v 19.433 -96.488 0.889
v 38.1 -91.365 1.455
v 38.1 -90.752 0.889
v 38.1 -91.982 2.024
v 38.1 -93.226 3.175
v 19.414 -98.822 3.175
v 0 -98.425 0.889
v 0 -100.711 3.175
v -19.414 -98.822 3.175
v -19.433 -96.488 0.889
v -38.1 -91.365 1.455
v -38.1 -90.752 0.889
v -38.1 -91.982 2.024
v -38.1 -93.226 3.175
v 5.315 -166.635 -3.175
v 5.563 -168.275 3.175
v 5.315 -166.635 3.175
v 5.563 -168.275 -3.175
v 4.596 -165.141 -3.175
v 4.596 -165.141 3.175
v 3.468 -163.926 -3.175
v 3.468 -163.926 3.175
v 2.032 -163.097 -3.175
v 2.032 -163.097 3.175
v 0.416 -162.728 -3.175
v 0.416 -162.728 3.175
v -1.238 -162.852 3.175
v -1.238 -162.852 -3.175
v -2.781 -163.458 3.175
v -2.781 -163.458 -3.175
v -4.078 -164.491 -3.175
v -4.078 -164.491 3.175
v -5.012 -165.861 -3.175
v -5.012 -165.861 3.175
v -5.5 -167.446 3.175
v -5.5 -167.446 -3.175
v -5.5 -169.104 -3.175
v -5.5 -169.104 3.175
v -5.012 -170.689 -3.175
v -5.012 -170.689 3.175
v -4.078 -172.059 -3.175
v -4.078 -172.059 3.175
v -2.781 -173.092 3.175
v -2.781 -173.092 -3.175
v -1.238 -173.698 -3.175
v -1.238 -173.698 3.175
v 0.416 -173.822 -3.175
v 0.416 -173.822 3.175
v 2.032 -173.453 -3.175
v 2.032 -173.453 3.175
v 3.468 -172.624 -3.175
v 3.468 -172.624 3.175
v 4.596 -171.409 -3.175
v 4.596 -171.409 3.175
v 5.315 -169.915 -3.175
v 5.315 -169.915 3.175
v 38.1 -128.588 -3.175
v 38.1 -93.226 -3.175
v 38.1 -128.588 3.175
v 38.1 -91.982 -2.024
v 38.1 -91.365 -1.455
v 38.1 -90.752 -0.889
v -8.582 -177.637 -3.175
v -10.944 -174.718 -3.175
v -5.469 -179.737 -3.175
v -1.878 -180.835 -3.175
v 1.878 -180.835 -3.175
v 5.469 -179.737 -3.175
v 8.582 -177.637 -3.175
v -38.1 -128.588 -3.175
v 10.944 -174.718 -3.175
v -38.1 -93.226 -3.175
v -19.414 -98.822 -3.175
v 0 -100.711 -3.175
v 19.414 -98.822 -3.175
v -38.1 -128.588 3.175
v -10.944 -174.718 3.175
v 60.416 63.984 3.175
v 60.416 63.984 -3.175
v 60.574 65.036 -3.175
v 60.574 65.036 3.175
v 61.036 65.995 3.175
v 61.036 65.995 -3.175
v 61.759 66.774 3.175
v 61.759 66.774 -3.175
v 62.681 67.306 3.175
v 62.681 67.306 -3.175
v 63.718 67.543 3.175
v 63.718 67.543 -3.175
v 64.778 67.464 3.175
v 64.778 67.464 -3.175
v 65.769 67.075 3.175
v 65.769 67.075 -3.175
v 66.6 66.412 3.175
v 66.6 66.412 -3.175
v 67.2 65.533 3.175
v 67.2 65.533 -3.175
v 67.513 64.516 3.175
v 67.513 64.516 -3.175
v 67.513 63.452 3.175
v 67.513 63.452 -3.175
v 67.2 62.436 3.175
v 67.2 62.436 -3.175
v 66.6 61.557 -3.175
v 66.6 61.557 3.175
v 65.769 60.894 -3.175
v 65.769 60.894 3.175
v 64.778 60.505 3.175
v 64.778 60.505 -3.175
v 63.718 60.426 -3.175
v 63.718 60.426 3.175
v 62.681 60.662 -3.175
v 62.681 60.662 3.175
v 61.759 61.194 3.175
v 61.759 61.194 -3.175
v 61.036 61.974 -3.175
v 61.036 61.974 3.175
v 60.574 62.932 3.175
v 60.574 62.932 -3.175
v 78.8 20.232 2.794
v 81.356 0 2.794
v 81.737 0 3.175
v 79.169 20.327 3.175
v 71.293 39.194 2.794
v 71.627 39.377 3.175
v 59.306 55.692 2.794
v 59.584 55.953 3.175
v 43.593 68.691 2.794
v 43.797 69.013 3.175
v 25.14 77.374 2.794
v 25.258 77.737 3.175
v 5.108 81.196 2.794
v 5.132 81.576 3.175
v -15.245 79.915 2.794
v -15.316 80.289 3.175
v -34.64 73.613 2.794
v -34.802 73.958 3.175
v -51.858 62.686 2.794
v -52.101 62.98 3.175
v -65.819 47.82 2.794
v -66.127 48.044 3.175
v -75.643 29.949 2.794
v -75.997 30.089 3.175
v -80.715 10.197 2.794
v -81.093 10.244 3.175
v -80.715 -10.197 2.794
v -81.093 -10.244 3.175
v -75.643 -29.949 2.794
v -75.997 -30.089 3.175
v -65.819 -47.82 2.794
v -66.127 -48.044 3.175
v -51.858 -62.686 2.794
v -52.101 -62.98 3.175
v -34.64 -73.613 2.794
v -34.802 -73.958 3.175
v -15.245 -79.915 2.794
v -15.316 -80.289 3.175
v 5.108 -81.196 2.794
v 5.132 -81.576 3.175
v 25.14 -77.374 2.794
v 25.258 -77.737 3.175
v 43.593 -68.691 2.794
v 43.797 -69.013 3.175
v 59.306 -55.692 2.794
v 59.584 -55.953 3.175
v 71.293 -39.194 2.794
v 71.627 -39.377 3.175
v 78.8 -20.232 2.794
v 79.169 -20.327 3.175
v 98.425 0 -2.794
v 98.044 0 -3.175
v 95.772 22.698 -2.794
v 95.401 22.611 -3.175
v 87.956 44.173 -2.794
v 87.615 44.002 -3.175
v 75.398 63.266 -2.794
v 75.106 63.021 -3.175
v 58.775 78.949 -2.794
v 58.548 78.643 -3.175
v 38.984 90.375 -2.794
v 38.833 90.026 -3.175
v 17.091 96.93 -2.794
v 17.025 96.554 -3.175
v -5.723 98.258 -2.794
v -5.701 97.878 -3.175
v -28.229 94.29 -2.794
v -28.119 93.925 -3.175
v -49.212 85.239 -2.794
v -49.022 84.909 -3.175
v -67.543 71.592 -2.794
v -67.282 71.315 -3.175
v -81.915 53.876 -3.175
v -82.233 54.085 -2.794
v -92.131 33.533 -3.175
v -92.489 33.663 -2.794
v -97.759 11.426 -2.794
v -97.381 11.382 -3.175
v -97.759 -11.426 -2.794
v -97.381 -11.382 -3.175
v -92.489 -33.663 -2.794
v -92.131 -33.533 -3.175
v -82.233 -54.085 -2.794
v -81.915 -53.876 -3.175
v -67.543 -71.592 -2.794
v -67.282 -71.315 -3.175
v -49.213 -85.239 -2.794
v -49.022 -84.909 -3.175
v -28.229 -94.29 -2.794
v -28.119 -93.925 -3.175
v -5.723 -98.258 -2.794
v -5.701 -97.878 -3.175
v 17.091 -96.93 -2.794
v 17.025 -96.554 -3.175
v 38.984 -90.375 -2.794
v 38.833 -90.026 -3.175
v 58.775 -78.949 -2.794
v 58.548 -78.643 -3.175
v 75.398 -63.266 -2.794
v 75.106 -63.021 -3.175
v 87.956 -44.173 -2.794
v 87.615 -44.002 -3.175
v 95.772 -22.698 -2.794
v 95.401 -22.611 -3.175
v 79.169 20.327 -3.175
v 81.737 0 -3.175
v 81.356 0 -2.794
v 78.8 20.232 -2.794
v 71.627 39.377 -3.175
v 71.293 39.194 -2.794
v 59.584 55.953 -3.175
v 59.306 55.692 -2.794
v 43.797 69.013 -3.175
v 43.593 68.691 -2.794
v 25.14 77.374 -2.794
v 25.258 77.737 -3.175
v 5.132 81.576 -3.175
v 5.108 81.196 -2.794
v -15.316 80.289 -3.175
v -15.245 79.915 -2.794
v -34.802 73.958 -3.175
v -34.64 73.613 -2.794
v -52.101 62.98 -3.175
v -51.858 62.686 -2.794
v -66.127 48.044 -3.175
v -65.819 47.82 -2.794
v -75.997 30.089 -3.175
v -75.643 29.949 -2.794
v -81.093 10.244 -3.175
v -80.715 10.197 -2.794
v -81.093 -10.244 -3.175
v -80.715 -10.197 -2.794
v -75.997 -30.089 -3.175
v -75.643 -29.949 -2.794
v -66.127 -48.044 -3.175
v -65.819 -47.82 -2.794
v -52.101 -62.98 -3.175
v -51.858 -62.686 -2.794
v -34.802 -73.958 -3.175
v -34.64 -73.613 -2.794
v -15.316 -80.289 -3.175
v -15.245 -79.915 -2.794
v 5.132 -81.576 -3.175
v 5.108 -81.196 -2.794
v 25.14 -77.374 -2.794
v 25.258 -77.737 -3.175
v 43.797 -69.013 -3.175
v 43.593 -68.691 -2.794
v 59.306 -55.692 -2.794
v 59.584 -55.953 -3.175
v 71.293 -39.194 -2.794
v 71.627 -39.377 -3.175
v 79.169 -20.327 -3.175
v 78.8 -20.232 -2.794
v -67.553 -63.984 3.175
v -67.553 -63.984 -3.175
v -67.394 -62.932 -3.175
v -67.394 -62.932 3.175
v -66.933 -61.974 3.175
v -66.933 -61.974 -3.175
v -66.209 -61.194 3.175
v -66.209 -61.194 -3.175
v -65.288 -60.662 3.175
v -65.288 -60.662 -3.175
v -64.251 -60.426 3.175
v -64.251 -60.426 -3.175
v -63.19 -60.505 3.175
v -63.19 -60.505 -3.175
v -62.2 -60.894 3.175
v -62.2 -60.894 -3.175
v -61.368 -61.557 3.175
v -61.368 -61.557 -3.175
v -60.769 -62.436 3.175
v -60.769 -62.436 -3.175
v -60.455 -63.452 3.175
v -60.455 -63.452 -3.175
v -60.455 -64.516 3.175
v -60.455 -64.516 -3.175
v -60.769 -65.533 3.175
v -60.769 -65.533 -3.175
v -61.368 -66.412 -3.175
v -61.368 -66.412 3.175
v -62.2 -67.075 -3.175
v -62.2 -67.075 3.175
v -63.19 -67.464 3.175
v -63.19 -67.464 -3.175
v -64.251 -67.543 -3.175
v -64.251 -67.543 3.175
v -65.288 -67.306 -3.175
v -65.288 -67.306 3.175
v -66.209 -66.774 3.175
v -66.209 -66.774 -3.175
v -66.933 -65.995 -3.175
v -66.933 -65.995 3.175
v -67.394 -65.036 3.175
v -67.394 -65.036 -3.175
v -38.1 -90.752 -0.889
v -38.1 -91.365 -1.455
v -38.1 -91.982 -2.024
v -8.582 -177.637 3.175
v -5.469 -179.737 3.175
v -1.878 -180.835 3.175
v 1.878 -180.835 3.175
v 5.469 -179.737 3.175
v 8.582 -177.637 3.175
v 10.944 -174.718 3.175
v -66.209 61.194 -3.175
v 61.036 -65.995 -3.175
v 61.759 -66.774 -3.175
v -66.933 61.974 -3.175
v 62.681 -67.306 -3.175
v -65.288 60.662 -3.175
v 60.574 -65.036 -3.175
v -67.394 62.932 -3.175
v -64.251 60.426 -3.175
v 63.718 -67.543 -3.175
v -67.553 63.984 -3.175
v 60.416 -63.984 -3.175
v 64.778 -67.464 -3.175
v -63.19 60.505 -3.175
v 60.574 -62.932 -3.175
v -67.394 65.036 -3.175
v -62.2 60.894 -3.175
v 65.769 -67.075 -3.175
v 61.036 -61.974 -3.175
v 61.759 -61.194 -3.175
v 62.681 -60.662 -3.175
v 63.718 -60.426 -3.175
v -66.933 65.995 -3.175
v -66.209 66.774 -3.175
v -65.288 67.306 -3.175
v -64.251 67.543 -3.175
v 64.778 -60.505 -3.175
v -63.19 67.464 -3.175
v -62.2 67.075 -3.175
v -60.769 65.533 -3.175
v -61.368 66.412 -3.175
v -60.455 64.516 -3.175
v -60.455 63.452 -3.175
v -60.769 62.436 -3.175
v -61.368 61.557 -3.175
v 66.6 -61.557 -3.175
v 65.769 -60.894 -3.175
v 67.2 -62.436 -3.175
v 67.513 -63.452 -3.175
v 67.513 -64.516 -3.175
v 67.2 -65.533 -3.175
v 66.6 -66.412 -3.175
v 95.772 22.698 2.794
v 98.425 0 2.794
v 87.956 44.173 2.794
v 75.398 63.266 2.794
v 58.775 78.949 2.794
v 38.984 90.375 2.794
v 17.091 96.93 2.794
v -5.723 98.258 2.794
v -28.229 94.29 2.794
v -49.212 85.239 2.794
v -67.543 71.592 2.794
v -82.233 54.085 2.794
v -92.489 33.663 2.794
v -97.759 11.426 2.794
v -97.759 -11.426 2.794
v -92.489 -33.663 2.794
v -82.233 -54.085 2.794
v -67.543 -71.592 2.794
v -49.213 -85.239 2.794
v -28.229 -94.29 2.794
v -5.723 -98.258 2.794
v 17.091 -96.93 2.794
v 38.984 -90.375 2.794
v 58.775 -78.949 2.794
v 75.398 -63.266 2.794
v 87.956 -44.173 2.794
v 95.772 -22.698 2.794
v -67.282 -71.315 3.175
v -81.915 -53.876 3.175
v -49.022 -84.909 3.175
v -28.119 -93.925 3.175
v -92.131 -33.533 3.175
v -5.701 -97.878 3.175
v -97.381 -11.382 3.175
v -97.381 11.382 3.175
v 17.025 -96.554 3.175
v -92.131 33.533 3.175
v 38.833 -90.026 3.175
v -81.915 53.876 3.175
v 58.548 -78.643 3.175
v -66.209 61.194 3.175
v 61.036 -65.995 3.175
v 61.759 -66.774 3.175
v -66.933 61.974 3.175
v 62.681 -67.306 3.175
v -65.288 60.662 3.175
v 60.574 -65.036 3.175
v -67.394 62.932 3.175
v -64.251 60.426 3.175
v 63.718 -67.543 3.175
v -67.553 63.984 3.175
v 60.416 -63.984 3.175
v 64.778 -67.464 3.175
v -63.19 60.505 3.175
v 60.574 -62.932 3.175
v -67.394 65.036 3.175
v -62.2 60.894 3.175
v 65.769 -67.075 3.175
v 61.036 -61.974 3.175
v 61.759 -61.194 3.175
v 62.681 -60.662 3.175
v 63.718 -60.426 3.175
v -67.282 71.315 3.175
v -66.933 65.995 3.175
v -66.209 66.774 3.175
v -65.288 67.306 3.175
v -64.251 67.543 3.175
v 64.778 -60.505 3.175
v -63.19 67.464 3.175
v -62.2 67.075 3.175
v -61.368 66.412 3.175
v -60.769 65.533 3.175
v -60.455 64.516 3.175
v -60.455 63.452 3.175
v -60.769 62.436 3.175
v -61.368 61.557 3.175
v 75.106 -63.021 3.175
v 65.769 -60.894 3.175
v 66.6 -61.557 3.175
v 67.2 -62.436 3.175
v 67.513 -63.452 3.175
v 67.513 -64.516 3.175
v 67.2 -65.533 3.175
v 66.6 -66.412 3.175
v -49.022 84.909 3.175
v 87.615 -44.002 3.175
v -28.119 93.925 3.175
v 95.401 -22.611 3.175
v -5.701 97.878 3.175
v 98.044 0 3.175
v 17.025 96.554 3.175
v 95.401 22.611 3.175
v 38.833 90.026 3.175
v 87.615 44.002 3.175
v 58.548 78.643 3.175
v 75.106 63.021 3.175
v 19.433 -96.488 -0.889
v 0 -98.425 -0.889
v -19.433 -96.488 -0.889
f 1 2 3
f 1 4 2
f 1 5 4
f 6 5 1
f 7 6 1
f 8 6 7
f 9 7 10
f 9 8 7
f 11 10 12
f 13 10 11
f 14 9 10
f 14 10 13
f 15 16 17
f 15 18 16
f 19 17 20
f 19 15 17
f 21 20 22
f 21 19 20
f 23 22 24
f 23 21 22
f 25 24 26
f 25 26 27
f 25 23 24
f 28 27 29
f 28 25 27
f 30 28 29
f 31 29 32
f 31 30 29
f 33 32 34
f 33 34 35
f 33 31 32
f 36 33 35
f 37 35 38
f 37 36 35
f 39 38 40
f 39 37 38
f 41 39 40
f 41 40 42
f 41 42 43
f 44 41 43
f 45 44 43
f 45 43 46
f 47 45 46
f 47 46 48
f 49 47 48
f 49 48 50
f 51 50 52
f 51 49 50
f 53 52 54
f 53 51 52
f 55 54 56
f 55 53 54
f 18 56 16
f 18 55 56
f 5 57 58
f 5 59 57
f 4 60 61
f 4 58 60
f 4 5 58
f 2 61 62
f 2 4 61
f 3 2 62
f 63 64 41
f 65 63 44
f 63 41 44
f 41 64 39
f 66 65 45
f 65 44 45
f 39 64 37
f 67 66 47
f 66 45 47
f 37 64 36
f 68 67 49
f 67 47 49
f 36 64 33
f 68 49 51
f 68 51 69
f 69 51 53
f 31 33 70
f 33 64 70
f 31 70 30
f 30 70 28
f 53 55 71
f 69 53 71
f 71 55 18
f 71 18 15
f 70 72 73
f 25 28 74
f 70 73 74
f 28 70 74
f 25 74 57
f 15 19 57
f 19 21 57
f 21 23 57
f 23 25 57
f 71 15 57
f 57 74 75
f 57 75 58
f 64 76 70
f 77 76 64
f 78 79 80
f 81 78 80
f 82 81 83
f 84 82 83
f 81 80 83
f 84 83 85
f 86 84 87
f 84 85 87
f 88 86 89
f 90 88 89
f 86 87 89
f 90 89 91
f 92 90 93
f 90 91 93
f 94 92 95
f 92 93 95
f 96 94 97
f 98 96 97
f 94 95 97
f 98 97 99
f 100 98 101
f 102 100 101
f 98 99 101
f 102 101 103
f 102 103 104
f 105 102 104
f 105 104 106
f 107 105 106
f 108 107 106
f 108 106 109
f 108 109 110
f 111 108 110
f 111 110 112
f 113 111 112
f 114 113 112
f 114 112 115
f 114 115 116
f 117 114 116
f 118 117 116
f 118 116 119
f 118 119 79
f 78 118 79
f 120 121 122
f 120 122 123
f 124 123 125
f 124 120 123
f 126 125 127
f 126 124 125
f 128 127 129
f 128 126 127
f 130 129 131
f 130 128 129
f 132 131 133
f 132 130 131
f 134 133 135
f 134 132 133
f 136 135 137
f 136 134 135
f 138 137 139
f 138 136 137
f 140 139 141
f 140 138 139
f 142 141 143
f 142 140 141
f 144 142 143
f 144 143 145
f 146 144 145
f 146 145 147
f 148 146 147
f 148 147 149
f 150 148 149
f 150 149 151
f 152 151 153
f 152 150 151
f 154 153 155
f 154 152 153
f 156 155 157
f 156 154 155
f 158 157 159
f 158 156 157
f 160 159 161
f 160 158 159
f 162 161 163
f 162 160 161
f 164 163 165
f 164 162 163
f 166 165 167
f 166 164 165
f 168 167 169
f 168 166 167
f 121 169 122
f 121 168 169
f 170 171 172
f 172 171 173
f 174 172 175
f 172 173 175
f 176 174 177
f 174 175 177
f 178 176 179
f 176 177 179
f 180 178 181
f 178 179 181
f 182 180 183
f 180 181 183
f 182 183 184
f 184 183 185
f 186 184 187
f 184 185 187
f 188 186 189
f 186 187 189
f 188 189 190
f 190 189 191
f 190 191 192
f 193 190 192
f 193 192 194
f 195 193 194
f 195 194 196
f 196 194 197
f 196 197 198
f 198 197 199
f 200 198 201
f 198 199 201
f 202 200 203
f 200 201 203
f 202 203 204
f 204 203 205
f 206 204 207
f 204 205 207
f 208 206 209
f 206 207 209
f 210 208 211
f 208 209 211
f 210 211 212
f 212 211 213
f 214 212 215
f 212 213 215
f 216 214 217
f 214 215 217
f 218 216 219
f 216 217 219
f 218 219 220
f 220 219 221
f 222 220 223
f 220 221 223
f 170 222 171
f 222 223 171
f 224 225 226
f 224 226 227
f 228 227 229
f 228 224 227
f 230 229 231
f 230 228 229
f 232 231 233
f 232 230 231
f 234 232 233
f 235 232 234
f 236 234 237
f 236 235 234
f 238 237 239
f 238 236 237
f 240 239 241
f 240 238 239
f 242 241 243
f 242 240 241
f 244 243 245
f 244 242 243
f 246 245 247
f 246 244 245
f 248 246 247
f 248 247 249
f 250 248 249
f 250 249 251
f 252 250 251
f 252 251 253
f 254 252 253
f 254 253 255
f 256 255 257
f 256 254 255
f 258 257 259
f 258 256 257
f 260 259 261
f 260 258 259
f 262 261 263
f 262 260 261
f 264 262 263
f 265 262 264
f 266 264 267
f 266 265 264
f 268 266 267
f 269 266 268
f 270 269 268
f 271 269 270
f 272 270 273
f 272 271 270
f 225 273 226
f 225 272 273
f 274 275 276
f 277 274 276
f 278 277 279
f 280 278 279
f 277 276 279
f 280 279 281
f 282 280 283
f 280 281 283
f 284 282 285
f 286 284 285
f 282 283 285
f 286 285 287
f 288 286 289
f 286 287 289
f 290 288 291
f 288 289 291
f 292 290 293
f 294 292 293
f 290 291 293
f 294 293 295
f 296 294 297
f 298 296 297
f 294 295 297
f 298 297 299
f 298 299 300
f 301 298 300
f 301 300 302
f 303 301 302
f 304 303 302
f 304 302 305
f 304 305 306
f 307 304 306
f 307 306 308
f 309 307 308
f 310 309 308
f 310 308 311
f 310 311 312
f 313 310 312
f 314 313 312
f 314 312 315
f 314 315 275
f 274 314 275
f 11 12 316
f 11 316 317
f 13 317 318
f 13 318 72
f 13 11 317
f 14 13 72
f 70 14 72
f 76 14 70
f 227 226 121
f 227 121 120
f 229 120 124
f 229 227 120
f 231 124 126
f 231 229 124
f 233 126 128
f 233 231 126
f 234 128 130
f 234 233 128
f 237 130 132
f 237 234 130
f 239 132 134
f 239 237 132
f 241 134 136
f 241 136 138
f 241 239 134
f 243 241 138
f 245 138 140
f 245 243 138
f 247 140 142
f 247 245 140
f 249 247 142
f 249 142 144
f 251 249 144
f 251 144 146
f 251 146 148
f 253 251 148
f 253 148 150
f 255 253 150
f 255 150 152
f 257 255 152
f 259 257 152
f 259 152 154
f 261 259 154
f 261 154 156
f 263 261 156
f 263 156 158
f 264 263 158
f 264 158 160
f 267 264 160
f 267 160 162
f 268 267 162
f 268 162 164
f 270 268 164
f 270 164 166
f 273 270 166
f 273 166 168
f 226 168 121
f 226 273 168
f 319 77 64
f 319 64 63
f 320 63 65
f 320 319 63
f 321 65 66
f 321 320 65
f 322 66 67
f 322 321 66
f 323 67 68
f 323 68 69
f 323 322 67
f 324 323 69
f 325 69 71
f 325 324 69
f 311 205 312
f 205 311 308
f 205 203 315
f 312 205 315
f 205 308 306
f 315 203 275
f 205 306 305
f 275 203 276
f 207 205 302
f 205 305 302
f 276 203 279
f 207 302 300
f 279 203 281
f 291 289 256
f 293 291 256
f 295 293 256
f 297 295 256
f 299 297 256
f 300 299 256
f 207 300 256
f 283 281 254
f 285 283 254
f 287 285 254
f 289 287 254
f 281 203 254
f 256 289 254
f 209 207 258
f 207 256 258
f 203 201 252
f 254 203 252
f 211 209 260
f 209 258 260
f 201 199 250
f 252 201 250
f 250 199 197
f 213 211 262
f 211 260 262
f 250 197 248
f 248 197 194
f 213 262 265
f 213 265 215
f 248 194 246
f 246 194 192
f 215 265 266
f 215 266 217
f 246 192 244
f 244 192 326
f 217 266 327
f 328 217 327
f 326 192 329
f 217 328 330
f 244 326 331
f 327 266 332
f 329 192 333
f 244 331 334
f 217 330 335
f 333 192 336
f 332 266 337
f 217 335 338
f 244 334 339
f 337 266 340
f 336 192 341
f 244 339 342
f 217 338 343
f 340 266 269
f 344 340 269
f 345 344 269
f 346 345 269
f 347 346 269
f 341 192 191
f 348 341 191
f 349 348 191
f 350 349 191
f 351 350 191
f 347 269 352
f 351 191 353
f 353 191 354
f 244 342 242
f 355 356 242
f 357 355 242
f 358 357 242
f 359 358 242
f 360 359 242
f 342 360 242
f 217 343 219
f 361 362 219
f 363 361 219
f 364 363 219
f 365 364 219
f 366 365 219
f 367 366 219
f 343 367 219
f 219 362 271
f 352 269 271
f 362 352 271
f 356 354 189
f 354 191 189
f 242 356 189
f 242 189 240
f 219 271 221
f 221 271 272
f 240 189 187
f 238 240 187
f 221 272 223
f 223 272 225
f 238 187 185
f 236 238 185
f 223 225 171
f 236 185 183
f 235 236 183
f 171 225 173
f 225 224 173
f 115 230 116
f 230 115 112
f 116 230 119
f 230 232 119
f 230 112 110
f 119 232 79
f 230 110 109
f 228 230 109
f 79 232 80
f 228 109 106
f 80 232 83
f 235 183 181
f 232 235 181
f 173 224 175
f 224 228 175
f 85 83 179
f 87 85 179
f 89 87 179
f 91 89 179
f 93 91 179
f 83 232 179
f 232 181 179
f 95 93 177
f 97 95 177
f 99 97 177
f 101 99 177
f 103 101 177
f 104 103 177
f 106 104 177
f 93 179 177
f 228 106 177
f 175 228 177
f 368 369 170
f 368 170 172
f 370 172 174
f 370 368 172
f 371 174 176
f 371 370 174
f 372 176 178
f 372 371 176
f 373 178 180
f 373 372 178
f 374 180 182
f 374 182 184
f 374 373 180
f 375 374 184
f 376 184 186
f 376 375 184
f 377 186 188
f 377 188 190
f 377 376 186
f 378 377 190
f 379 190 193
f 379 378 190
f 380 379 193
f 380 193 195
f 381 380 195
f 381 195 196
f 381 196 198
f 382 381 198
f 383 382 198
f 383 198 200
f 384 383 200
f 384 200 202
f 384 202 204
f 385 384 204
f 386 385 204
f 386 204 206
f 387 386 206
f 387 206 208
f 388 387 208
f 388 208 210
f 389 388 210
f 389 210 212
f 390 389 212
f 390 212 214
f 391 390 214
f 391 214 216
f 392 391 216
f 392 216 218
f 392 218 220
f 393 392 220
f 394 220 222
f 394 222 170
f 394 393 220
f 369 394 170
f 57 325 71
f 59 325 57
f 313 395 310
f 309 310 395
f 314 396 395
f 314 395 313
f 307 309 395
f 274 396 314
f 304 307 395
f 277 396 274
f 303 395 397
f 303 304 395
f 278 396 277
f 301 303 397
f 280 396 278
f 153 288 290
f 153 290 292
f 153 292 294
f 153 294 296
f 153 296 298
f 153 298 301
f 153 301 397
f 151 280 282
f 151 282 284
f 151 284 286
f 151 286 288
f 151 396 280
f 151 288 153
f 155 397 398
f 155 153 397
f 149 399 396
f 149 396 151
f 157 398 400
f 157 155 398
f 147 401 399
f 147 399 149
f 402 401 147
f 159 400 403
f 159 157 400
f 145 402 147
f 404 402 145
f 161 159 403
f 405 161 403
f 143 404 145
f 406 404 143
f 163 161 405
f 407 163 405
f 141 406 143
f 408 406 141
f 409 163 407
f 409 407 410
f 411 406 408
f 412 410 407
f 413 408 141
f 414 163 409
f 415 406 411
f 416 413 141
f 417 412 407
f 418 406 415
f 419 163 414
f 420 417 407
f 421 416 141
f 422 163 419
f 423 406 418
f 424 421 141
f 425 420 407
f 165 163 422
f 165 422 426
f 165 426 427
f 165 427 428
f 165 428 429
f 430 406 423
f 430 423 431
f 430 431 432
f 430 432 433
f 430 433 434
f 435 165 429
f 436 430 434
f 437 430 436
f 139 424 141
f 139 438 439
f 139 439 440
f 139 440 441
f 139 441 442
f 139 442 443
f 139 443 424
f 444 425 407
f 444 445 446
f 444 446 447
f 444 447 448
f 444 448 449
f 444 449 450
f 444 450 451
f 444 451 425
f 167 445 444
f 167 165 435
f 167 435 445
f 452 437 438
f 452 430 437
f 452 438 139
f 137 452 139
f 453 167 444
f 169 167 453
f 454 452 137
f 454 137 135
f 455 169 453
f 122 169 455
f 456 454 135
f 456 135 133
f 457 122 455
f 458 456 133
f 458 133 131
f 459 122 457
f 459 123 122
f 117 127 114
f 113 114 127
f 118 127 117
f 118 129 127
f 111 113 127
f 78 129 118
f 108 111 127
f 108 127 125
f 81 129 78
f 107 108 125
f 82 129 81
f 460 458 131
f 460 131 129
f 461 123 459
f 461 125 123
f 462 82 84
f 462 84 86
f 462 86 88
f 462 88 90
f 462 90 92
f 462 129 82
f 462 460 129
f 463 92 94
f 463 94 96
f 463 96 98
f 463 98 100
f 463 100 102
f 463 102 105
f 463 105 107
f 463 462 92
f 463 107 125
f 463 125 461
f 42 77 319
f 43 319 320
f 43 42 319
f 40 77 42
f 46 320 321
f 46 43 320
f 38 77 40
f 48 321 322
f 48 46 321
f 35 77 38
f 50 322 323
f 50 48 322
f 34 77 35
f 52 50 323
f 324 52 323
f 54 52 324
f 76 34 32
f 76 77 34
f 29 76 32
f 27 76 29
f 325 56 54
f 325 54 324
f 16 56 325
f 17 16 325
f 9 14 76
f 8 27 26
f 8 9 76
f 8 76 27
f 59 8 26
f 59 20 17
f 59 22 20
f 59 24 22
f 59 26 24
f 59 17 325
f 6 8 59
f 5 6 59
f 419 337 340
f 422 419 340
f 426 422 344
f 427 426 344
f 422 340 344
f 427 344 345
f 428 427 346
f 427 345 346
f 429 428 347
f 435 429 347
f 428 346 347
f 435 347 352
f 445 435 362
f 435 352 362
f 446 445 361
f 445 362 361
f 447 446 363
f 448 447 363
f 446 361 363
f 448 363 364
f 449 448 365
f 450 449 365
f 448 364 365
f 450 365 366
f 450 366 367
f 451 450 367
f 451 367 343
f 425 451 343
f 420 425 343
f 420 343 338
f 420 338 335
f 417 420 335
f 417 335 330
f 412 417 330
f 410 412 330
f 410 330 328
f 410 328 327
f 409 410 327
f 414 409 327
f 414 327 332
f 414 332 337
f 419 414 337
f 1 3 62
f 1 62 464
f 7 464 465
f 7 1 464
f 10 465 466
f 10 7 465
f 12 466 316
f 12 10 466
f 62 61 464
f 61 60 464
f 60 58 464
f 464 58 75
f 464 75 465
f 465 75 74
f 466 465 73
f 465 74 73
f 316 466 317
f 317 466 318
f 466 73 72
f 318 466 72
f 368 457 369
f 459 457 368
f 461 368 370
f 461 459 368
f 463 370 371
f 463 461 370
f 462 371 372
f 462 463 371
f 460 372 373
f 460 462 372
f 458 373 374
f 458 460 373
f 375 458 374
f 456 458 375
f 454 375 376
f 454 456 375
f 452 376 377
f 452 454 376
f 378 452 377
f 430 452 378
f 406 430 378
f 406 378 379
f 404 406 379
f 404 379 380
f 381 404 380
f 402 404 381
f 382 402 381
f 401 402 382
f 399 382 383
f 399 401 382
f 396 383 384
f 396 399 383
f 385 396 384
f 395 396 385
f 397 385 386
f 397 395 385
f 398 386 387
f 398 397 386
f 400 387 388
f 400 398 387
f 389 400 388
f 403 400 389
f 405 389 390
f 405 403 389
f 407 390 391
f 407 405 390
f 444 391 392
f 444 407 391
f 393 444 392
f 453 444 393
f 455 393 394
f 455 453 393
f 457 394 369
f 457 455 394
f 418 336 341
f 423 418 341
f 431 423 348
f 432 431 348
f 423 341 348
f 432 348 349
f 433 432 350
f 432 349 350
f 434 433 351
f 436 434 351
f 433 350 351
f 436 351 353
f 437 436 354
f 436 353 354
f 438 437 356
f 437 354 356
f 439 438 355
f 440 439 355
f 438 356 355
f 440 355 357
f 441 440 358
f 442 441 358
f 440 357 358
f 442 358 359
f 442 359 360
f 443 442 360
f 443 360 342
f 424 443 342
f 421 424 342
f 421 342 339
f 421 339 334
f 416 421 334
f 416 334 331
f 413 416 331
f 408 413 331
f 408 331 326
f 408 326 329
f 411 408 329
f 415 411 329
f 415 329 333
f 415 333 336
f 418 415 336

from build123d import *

# Parameters (mm, degrees)
F0_R     = 5.5626
F1_DEPTH = 3.175
F2_R     = 98.425
F2_R_2   = 81.3562
F3_DEPTH = 3.175
F4_SIZE  = 0.381
F5_SIZE  = 2.286
F7_D     = 7.1374


with BuildPart() as f1:
    # F0 (on Top) → F1 (new body, symmetric)
    with BuildSketch(Plane.XY):
        with BuildLine():
            ThreePointArc((38.1, -90.751698), (0, -98.425), (-38.1, -90.751698))
            Line((-38.1, -90.751698), (-38.1, -128.5875))
            Line((-38.1, -128.5875), (-10.944479, -174.7177))
            ThreePointArc((-10.944479, -174.7177), (0, -180.975), (10.944479, -174.7177))
            Line((10.944479, -174.7177), (38.1, -128.5875))
            Line((38.1, -128.5875), (38.1, -90.751698))
        make_face()
        with Locations((0, -168.275)):
            Circle(F0_R, mode=Mode.SUBTRACT)
    extrude(amount=F1_DEPTH, both=True)

    # F5
    f5_edges = [f1.edges().sort_by_distance(p)[0] for p in [
        (0, -98.425, 3.175),
        (0, -98.425, -3.175),
    ]]
    chamfer(f5_edges, length=F5_SIZE)


with BuildPart() as f3:
    # F2 (on Top) → F3 (new body, symmetric)
    with BuildSketch(Plane.XY):
        Circle(F2_R)
        Circle(F2_R_2, mode=Mode.SUBTRACT)
    extrude(amount=F3_DEPTH, both=True)

    # F4
    f4_edges = [f3.edges().sort_by_distance(p)[0] for p in [
        (-98.425, 0, 3.175),
        (-81.3562, 0, 3.175),
        (-81.3562, 0, -3.175),
        (-98.425, 0, -3.175),
    ]]
    chamfer(f4_edges, length=F4_SIZE)

    # F7 (through all)
    with Locations(Plane.XY.offset(3.175)):
        with Locations((-63.984325, -63.984325), (-63.984325, 63.984325), (63.984325, 63.984325), (63.984325, -63.984325)):
            Hole(F7_D / 2)


solid = Compound([f1.part, f3.part])
